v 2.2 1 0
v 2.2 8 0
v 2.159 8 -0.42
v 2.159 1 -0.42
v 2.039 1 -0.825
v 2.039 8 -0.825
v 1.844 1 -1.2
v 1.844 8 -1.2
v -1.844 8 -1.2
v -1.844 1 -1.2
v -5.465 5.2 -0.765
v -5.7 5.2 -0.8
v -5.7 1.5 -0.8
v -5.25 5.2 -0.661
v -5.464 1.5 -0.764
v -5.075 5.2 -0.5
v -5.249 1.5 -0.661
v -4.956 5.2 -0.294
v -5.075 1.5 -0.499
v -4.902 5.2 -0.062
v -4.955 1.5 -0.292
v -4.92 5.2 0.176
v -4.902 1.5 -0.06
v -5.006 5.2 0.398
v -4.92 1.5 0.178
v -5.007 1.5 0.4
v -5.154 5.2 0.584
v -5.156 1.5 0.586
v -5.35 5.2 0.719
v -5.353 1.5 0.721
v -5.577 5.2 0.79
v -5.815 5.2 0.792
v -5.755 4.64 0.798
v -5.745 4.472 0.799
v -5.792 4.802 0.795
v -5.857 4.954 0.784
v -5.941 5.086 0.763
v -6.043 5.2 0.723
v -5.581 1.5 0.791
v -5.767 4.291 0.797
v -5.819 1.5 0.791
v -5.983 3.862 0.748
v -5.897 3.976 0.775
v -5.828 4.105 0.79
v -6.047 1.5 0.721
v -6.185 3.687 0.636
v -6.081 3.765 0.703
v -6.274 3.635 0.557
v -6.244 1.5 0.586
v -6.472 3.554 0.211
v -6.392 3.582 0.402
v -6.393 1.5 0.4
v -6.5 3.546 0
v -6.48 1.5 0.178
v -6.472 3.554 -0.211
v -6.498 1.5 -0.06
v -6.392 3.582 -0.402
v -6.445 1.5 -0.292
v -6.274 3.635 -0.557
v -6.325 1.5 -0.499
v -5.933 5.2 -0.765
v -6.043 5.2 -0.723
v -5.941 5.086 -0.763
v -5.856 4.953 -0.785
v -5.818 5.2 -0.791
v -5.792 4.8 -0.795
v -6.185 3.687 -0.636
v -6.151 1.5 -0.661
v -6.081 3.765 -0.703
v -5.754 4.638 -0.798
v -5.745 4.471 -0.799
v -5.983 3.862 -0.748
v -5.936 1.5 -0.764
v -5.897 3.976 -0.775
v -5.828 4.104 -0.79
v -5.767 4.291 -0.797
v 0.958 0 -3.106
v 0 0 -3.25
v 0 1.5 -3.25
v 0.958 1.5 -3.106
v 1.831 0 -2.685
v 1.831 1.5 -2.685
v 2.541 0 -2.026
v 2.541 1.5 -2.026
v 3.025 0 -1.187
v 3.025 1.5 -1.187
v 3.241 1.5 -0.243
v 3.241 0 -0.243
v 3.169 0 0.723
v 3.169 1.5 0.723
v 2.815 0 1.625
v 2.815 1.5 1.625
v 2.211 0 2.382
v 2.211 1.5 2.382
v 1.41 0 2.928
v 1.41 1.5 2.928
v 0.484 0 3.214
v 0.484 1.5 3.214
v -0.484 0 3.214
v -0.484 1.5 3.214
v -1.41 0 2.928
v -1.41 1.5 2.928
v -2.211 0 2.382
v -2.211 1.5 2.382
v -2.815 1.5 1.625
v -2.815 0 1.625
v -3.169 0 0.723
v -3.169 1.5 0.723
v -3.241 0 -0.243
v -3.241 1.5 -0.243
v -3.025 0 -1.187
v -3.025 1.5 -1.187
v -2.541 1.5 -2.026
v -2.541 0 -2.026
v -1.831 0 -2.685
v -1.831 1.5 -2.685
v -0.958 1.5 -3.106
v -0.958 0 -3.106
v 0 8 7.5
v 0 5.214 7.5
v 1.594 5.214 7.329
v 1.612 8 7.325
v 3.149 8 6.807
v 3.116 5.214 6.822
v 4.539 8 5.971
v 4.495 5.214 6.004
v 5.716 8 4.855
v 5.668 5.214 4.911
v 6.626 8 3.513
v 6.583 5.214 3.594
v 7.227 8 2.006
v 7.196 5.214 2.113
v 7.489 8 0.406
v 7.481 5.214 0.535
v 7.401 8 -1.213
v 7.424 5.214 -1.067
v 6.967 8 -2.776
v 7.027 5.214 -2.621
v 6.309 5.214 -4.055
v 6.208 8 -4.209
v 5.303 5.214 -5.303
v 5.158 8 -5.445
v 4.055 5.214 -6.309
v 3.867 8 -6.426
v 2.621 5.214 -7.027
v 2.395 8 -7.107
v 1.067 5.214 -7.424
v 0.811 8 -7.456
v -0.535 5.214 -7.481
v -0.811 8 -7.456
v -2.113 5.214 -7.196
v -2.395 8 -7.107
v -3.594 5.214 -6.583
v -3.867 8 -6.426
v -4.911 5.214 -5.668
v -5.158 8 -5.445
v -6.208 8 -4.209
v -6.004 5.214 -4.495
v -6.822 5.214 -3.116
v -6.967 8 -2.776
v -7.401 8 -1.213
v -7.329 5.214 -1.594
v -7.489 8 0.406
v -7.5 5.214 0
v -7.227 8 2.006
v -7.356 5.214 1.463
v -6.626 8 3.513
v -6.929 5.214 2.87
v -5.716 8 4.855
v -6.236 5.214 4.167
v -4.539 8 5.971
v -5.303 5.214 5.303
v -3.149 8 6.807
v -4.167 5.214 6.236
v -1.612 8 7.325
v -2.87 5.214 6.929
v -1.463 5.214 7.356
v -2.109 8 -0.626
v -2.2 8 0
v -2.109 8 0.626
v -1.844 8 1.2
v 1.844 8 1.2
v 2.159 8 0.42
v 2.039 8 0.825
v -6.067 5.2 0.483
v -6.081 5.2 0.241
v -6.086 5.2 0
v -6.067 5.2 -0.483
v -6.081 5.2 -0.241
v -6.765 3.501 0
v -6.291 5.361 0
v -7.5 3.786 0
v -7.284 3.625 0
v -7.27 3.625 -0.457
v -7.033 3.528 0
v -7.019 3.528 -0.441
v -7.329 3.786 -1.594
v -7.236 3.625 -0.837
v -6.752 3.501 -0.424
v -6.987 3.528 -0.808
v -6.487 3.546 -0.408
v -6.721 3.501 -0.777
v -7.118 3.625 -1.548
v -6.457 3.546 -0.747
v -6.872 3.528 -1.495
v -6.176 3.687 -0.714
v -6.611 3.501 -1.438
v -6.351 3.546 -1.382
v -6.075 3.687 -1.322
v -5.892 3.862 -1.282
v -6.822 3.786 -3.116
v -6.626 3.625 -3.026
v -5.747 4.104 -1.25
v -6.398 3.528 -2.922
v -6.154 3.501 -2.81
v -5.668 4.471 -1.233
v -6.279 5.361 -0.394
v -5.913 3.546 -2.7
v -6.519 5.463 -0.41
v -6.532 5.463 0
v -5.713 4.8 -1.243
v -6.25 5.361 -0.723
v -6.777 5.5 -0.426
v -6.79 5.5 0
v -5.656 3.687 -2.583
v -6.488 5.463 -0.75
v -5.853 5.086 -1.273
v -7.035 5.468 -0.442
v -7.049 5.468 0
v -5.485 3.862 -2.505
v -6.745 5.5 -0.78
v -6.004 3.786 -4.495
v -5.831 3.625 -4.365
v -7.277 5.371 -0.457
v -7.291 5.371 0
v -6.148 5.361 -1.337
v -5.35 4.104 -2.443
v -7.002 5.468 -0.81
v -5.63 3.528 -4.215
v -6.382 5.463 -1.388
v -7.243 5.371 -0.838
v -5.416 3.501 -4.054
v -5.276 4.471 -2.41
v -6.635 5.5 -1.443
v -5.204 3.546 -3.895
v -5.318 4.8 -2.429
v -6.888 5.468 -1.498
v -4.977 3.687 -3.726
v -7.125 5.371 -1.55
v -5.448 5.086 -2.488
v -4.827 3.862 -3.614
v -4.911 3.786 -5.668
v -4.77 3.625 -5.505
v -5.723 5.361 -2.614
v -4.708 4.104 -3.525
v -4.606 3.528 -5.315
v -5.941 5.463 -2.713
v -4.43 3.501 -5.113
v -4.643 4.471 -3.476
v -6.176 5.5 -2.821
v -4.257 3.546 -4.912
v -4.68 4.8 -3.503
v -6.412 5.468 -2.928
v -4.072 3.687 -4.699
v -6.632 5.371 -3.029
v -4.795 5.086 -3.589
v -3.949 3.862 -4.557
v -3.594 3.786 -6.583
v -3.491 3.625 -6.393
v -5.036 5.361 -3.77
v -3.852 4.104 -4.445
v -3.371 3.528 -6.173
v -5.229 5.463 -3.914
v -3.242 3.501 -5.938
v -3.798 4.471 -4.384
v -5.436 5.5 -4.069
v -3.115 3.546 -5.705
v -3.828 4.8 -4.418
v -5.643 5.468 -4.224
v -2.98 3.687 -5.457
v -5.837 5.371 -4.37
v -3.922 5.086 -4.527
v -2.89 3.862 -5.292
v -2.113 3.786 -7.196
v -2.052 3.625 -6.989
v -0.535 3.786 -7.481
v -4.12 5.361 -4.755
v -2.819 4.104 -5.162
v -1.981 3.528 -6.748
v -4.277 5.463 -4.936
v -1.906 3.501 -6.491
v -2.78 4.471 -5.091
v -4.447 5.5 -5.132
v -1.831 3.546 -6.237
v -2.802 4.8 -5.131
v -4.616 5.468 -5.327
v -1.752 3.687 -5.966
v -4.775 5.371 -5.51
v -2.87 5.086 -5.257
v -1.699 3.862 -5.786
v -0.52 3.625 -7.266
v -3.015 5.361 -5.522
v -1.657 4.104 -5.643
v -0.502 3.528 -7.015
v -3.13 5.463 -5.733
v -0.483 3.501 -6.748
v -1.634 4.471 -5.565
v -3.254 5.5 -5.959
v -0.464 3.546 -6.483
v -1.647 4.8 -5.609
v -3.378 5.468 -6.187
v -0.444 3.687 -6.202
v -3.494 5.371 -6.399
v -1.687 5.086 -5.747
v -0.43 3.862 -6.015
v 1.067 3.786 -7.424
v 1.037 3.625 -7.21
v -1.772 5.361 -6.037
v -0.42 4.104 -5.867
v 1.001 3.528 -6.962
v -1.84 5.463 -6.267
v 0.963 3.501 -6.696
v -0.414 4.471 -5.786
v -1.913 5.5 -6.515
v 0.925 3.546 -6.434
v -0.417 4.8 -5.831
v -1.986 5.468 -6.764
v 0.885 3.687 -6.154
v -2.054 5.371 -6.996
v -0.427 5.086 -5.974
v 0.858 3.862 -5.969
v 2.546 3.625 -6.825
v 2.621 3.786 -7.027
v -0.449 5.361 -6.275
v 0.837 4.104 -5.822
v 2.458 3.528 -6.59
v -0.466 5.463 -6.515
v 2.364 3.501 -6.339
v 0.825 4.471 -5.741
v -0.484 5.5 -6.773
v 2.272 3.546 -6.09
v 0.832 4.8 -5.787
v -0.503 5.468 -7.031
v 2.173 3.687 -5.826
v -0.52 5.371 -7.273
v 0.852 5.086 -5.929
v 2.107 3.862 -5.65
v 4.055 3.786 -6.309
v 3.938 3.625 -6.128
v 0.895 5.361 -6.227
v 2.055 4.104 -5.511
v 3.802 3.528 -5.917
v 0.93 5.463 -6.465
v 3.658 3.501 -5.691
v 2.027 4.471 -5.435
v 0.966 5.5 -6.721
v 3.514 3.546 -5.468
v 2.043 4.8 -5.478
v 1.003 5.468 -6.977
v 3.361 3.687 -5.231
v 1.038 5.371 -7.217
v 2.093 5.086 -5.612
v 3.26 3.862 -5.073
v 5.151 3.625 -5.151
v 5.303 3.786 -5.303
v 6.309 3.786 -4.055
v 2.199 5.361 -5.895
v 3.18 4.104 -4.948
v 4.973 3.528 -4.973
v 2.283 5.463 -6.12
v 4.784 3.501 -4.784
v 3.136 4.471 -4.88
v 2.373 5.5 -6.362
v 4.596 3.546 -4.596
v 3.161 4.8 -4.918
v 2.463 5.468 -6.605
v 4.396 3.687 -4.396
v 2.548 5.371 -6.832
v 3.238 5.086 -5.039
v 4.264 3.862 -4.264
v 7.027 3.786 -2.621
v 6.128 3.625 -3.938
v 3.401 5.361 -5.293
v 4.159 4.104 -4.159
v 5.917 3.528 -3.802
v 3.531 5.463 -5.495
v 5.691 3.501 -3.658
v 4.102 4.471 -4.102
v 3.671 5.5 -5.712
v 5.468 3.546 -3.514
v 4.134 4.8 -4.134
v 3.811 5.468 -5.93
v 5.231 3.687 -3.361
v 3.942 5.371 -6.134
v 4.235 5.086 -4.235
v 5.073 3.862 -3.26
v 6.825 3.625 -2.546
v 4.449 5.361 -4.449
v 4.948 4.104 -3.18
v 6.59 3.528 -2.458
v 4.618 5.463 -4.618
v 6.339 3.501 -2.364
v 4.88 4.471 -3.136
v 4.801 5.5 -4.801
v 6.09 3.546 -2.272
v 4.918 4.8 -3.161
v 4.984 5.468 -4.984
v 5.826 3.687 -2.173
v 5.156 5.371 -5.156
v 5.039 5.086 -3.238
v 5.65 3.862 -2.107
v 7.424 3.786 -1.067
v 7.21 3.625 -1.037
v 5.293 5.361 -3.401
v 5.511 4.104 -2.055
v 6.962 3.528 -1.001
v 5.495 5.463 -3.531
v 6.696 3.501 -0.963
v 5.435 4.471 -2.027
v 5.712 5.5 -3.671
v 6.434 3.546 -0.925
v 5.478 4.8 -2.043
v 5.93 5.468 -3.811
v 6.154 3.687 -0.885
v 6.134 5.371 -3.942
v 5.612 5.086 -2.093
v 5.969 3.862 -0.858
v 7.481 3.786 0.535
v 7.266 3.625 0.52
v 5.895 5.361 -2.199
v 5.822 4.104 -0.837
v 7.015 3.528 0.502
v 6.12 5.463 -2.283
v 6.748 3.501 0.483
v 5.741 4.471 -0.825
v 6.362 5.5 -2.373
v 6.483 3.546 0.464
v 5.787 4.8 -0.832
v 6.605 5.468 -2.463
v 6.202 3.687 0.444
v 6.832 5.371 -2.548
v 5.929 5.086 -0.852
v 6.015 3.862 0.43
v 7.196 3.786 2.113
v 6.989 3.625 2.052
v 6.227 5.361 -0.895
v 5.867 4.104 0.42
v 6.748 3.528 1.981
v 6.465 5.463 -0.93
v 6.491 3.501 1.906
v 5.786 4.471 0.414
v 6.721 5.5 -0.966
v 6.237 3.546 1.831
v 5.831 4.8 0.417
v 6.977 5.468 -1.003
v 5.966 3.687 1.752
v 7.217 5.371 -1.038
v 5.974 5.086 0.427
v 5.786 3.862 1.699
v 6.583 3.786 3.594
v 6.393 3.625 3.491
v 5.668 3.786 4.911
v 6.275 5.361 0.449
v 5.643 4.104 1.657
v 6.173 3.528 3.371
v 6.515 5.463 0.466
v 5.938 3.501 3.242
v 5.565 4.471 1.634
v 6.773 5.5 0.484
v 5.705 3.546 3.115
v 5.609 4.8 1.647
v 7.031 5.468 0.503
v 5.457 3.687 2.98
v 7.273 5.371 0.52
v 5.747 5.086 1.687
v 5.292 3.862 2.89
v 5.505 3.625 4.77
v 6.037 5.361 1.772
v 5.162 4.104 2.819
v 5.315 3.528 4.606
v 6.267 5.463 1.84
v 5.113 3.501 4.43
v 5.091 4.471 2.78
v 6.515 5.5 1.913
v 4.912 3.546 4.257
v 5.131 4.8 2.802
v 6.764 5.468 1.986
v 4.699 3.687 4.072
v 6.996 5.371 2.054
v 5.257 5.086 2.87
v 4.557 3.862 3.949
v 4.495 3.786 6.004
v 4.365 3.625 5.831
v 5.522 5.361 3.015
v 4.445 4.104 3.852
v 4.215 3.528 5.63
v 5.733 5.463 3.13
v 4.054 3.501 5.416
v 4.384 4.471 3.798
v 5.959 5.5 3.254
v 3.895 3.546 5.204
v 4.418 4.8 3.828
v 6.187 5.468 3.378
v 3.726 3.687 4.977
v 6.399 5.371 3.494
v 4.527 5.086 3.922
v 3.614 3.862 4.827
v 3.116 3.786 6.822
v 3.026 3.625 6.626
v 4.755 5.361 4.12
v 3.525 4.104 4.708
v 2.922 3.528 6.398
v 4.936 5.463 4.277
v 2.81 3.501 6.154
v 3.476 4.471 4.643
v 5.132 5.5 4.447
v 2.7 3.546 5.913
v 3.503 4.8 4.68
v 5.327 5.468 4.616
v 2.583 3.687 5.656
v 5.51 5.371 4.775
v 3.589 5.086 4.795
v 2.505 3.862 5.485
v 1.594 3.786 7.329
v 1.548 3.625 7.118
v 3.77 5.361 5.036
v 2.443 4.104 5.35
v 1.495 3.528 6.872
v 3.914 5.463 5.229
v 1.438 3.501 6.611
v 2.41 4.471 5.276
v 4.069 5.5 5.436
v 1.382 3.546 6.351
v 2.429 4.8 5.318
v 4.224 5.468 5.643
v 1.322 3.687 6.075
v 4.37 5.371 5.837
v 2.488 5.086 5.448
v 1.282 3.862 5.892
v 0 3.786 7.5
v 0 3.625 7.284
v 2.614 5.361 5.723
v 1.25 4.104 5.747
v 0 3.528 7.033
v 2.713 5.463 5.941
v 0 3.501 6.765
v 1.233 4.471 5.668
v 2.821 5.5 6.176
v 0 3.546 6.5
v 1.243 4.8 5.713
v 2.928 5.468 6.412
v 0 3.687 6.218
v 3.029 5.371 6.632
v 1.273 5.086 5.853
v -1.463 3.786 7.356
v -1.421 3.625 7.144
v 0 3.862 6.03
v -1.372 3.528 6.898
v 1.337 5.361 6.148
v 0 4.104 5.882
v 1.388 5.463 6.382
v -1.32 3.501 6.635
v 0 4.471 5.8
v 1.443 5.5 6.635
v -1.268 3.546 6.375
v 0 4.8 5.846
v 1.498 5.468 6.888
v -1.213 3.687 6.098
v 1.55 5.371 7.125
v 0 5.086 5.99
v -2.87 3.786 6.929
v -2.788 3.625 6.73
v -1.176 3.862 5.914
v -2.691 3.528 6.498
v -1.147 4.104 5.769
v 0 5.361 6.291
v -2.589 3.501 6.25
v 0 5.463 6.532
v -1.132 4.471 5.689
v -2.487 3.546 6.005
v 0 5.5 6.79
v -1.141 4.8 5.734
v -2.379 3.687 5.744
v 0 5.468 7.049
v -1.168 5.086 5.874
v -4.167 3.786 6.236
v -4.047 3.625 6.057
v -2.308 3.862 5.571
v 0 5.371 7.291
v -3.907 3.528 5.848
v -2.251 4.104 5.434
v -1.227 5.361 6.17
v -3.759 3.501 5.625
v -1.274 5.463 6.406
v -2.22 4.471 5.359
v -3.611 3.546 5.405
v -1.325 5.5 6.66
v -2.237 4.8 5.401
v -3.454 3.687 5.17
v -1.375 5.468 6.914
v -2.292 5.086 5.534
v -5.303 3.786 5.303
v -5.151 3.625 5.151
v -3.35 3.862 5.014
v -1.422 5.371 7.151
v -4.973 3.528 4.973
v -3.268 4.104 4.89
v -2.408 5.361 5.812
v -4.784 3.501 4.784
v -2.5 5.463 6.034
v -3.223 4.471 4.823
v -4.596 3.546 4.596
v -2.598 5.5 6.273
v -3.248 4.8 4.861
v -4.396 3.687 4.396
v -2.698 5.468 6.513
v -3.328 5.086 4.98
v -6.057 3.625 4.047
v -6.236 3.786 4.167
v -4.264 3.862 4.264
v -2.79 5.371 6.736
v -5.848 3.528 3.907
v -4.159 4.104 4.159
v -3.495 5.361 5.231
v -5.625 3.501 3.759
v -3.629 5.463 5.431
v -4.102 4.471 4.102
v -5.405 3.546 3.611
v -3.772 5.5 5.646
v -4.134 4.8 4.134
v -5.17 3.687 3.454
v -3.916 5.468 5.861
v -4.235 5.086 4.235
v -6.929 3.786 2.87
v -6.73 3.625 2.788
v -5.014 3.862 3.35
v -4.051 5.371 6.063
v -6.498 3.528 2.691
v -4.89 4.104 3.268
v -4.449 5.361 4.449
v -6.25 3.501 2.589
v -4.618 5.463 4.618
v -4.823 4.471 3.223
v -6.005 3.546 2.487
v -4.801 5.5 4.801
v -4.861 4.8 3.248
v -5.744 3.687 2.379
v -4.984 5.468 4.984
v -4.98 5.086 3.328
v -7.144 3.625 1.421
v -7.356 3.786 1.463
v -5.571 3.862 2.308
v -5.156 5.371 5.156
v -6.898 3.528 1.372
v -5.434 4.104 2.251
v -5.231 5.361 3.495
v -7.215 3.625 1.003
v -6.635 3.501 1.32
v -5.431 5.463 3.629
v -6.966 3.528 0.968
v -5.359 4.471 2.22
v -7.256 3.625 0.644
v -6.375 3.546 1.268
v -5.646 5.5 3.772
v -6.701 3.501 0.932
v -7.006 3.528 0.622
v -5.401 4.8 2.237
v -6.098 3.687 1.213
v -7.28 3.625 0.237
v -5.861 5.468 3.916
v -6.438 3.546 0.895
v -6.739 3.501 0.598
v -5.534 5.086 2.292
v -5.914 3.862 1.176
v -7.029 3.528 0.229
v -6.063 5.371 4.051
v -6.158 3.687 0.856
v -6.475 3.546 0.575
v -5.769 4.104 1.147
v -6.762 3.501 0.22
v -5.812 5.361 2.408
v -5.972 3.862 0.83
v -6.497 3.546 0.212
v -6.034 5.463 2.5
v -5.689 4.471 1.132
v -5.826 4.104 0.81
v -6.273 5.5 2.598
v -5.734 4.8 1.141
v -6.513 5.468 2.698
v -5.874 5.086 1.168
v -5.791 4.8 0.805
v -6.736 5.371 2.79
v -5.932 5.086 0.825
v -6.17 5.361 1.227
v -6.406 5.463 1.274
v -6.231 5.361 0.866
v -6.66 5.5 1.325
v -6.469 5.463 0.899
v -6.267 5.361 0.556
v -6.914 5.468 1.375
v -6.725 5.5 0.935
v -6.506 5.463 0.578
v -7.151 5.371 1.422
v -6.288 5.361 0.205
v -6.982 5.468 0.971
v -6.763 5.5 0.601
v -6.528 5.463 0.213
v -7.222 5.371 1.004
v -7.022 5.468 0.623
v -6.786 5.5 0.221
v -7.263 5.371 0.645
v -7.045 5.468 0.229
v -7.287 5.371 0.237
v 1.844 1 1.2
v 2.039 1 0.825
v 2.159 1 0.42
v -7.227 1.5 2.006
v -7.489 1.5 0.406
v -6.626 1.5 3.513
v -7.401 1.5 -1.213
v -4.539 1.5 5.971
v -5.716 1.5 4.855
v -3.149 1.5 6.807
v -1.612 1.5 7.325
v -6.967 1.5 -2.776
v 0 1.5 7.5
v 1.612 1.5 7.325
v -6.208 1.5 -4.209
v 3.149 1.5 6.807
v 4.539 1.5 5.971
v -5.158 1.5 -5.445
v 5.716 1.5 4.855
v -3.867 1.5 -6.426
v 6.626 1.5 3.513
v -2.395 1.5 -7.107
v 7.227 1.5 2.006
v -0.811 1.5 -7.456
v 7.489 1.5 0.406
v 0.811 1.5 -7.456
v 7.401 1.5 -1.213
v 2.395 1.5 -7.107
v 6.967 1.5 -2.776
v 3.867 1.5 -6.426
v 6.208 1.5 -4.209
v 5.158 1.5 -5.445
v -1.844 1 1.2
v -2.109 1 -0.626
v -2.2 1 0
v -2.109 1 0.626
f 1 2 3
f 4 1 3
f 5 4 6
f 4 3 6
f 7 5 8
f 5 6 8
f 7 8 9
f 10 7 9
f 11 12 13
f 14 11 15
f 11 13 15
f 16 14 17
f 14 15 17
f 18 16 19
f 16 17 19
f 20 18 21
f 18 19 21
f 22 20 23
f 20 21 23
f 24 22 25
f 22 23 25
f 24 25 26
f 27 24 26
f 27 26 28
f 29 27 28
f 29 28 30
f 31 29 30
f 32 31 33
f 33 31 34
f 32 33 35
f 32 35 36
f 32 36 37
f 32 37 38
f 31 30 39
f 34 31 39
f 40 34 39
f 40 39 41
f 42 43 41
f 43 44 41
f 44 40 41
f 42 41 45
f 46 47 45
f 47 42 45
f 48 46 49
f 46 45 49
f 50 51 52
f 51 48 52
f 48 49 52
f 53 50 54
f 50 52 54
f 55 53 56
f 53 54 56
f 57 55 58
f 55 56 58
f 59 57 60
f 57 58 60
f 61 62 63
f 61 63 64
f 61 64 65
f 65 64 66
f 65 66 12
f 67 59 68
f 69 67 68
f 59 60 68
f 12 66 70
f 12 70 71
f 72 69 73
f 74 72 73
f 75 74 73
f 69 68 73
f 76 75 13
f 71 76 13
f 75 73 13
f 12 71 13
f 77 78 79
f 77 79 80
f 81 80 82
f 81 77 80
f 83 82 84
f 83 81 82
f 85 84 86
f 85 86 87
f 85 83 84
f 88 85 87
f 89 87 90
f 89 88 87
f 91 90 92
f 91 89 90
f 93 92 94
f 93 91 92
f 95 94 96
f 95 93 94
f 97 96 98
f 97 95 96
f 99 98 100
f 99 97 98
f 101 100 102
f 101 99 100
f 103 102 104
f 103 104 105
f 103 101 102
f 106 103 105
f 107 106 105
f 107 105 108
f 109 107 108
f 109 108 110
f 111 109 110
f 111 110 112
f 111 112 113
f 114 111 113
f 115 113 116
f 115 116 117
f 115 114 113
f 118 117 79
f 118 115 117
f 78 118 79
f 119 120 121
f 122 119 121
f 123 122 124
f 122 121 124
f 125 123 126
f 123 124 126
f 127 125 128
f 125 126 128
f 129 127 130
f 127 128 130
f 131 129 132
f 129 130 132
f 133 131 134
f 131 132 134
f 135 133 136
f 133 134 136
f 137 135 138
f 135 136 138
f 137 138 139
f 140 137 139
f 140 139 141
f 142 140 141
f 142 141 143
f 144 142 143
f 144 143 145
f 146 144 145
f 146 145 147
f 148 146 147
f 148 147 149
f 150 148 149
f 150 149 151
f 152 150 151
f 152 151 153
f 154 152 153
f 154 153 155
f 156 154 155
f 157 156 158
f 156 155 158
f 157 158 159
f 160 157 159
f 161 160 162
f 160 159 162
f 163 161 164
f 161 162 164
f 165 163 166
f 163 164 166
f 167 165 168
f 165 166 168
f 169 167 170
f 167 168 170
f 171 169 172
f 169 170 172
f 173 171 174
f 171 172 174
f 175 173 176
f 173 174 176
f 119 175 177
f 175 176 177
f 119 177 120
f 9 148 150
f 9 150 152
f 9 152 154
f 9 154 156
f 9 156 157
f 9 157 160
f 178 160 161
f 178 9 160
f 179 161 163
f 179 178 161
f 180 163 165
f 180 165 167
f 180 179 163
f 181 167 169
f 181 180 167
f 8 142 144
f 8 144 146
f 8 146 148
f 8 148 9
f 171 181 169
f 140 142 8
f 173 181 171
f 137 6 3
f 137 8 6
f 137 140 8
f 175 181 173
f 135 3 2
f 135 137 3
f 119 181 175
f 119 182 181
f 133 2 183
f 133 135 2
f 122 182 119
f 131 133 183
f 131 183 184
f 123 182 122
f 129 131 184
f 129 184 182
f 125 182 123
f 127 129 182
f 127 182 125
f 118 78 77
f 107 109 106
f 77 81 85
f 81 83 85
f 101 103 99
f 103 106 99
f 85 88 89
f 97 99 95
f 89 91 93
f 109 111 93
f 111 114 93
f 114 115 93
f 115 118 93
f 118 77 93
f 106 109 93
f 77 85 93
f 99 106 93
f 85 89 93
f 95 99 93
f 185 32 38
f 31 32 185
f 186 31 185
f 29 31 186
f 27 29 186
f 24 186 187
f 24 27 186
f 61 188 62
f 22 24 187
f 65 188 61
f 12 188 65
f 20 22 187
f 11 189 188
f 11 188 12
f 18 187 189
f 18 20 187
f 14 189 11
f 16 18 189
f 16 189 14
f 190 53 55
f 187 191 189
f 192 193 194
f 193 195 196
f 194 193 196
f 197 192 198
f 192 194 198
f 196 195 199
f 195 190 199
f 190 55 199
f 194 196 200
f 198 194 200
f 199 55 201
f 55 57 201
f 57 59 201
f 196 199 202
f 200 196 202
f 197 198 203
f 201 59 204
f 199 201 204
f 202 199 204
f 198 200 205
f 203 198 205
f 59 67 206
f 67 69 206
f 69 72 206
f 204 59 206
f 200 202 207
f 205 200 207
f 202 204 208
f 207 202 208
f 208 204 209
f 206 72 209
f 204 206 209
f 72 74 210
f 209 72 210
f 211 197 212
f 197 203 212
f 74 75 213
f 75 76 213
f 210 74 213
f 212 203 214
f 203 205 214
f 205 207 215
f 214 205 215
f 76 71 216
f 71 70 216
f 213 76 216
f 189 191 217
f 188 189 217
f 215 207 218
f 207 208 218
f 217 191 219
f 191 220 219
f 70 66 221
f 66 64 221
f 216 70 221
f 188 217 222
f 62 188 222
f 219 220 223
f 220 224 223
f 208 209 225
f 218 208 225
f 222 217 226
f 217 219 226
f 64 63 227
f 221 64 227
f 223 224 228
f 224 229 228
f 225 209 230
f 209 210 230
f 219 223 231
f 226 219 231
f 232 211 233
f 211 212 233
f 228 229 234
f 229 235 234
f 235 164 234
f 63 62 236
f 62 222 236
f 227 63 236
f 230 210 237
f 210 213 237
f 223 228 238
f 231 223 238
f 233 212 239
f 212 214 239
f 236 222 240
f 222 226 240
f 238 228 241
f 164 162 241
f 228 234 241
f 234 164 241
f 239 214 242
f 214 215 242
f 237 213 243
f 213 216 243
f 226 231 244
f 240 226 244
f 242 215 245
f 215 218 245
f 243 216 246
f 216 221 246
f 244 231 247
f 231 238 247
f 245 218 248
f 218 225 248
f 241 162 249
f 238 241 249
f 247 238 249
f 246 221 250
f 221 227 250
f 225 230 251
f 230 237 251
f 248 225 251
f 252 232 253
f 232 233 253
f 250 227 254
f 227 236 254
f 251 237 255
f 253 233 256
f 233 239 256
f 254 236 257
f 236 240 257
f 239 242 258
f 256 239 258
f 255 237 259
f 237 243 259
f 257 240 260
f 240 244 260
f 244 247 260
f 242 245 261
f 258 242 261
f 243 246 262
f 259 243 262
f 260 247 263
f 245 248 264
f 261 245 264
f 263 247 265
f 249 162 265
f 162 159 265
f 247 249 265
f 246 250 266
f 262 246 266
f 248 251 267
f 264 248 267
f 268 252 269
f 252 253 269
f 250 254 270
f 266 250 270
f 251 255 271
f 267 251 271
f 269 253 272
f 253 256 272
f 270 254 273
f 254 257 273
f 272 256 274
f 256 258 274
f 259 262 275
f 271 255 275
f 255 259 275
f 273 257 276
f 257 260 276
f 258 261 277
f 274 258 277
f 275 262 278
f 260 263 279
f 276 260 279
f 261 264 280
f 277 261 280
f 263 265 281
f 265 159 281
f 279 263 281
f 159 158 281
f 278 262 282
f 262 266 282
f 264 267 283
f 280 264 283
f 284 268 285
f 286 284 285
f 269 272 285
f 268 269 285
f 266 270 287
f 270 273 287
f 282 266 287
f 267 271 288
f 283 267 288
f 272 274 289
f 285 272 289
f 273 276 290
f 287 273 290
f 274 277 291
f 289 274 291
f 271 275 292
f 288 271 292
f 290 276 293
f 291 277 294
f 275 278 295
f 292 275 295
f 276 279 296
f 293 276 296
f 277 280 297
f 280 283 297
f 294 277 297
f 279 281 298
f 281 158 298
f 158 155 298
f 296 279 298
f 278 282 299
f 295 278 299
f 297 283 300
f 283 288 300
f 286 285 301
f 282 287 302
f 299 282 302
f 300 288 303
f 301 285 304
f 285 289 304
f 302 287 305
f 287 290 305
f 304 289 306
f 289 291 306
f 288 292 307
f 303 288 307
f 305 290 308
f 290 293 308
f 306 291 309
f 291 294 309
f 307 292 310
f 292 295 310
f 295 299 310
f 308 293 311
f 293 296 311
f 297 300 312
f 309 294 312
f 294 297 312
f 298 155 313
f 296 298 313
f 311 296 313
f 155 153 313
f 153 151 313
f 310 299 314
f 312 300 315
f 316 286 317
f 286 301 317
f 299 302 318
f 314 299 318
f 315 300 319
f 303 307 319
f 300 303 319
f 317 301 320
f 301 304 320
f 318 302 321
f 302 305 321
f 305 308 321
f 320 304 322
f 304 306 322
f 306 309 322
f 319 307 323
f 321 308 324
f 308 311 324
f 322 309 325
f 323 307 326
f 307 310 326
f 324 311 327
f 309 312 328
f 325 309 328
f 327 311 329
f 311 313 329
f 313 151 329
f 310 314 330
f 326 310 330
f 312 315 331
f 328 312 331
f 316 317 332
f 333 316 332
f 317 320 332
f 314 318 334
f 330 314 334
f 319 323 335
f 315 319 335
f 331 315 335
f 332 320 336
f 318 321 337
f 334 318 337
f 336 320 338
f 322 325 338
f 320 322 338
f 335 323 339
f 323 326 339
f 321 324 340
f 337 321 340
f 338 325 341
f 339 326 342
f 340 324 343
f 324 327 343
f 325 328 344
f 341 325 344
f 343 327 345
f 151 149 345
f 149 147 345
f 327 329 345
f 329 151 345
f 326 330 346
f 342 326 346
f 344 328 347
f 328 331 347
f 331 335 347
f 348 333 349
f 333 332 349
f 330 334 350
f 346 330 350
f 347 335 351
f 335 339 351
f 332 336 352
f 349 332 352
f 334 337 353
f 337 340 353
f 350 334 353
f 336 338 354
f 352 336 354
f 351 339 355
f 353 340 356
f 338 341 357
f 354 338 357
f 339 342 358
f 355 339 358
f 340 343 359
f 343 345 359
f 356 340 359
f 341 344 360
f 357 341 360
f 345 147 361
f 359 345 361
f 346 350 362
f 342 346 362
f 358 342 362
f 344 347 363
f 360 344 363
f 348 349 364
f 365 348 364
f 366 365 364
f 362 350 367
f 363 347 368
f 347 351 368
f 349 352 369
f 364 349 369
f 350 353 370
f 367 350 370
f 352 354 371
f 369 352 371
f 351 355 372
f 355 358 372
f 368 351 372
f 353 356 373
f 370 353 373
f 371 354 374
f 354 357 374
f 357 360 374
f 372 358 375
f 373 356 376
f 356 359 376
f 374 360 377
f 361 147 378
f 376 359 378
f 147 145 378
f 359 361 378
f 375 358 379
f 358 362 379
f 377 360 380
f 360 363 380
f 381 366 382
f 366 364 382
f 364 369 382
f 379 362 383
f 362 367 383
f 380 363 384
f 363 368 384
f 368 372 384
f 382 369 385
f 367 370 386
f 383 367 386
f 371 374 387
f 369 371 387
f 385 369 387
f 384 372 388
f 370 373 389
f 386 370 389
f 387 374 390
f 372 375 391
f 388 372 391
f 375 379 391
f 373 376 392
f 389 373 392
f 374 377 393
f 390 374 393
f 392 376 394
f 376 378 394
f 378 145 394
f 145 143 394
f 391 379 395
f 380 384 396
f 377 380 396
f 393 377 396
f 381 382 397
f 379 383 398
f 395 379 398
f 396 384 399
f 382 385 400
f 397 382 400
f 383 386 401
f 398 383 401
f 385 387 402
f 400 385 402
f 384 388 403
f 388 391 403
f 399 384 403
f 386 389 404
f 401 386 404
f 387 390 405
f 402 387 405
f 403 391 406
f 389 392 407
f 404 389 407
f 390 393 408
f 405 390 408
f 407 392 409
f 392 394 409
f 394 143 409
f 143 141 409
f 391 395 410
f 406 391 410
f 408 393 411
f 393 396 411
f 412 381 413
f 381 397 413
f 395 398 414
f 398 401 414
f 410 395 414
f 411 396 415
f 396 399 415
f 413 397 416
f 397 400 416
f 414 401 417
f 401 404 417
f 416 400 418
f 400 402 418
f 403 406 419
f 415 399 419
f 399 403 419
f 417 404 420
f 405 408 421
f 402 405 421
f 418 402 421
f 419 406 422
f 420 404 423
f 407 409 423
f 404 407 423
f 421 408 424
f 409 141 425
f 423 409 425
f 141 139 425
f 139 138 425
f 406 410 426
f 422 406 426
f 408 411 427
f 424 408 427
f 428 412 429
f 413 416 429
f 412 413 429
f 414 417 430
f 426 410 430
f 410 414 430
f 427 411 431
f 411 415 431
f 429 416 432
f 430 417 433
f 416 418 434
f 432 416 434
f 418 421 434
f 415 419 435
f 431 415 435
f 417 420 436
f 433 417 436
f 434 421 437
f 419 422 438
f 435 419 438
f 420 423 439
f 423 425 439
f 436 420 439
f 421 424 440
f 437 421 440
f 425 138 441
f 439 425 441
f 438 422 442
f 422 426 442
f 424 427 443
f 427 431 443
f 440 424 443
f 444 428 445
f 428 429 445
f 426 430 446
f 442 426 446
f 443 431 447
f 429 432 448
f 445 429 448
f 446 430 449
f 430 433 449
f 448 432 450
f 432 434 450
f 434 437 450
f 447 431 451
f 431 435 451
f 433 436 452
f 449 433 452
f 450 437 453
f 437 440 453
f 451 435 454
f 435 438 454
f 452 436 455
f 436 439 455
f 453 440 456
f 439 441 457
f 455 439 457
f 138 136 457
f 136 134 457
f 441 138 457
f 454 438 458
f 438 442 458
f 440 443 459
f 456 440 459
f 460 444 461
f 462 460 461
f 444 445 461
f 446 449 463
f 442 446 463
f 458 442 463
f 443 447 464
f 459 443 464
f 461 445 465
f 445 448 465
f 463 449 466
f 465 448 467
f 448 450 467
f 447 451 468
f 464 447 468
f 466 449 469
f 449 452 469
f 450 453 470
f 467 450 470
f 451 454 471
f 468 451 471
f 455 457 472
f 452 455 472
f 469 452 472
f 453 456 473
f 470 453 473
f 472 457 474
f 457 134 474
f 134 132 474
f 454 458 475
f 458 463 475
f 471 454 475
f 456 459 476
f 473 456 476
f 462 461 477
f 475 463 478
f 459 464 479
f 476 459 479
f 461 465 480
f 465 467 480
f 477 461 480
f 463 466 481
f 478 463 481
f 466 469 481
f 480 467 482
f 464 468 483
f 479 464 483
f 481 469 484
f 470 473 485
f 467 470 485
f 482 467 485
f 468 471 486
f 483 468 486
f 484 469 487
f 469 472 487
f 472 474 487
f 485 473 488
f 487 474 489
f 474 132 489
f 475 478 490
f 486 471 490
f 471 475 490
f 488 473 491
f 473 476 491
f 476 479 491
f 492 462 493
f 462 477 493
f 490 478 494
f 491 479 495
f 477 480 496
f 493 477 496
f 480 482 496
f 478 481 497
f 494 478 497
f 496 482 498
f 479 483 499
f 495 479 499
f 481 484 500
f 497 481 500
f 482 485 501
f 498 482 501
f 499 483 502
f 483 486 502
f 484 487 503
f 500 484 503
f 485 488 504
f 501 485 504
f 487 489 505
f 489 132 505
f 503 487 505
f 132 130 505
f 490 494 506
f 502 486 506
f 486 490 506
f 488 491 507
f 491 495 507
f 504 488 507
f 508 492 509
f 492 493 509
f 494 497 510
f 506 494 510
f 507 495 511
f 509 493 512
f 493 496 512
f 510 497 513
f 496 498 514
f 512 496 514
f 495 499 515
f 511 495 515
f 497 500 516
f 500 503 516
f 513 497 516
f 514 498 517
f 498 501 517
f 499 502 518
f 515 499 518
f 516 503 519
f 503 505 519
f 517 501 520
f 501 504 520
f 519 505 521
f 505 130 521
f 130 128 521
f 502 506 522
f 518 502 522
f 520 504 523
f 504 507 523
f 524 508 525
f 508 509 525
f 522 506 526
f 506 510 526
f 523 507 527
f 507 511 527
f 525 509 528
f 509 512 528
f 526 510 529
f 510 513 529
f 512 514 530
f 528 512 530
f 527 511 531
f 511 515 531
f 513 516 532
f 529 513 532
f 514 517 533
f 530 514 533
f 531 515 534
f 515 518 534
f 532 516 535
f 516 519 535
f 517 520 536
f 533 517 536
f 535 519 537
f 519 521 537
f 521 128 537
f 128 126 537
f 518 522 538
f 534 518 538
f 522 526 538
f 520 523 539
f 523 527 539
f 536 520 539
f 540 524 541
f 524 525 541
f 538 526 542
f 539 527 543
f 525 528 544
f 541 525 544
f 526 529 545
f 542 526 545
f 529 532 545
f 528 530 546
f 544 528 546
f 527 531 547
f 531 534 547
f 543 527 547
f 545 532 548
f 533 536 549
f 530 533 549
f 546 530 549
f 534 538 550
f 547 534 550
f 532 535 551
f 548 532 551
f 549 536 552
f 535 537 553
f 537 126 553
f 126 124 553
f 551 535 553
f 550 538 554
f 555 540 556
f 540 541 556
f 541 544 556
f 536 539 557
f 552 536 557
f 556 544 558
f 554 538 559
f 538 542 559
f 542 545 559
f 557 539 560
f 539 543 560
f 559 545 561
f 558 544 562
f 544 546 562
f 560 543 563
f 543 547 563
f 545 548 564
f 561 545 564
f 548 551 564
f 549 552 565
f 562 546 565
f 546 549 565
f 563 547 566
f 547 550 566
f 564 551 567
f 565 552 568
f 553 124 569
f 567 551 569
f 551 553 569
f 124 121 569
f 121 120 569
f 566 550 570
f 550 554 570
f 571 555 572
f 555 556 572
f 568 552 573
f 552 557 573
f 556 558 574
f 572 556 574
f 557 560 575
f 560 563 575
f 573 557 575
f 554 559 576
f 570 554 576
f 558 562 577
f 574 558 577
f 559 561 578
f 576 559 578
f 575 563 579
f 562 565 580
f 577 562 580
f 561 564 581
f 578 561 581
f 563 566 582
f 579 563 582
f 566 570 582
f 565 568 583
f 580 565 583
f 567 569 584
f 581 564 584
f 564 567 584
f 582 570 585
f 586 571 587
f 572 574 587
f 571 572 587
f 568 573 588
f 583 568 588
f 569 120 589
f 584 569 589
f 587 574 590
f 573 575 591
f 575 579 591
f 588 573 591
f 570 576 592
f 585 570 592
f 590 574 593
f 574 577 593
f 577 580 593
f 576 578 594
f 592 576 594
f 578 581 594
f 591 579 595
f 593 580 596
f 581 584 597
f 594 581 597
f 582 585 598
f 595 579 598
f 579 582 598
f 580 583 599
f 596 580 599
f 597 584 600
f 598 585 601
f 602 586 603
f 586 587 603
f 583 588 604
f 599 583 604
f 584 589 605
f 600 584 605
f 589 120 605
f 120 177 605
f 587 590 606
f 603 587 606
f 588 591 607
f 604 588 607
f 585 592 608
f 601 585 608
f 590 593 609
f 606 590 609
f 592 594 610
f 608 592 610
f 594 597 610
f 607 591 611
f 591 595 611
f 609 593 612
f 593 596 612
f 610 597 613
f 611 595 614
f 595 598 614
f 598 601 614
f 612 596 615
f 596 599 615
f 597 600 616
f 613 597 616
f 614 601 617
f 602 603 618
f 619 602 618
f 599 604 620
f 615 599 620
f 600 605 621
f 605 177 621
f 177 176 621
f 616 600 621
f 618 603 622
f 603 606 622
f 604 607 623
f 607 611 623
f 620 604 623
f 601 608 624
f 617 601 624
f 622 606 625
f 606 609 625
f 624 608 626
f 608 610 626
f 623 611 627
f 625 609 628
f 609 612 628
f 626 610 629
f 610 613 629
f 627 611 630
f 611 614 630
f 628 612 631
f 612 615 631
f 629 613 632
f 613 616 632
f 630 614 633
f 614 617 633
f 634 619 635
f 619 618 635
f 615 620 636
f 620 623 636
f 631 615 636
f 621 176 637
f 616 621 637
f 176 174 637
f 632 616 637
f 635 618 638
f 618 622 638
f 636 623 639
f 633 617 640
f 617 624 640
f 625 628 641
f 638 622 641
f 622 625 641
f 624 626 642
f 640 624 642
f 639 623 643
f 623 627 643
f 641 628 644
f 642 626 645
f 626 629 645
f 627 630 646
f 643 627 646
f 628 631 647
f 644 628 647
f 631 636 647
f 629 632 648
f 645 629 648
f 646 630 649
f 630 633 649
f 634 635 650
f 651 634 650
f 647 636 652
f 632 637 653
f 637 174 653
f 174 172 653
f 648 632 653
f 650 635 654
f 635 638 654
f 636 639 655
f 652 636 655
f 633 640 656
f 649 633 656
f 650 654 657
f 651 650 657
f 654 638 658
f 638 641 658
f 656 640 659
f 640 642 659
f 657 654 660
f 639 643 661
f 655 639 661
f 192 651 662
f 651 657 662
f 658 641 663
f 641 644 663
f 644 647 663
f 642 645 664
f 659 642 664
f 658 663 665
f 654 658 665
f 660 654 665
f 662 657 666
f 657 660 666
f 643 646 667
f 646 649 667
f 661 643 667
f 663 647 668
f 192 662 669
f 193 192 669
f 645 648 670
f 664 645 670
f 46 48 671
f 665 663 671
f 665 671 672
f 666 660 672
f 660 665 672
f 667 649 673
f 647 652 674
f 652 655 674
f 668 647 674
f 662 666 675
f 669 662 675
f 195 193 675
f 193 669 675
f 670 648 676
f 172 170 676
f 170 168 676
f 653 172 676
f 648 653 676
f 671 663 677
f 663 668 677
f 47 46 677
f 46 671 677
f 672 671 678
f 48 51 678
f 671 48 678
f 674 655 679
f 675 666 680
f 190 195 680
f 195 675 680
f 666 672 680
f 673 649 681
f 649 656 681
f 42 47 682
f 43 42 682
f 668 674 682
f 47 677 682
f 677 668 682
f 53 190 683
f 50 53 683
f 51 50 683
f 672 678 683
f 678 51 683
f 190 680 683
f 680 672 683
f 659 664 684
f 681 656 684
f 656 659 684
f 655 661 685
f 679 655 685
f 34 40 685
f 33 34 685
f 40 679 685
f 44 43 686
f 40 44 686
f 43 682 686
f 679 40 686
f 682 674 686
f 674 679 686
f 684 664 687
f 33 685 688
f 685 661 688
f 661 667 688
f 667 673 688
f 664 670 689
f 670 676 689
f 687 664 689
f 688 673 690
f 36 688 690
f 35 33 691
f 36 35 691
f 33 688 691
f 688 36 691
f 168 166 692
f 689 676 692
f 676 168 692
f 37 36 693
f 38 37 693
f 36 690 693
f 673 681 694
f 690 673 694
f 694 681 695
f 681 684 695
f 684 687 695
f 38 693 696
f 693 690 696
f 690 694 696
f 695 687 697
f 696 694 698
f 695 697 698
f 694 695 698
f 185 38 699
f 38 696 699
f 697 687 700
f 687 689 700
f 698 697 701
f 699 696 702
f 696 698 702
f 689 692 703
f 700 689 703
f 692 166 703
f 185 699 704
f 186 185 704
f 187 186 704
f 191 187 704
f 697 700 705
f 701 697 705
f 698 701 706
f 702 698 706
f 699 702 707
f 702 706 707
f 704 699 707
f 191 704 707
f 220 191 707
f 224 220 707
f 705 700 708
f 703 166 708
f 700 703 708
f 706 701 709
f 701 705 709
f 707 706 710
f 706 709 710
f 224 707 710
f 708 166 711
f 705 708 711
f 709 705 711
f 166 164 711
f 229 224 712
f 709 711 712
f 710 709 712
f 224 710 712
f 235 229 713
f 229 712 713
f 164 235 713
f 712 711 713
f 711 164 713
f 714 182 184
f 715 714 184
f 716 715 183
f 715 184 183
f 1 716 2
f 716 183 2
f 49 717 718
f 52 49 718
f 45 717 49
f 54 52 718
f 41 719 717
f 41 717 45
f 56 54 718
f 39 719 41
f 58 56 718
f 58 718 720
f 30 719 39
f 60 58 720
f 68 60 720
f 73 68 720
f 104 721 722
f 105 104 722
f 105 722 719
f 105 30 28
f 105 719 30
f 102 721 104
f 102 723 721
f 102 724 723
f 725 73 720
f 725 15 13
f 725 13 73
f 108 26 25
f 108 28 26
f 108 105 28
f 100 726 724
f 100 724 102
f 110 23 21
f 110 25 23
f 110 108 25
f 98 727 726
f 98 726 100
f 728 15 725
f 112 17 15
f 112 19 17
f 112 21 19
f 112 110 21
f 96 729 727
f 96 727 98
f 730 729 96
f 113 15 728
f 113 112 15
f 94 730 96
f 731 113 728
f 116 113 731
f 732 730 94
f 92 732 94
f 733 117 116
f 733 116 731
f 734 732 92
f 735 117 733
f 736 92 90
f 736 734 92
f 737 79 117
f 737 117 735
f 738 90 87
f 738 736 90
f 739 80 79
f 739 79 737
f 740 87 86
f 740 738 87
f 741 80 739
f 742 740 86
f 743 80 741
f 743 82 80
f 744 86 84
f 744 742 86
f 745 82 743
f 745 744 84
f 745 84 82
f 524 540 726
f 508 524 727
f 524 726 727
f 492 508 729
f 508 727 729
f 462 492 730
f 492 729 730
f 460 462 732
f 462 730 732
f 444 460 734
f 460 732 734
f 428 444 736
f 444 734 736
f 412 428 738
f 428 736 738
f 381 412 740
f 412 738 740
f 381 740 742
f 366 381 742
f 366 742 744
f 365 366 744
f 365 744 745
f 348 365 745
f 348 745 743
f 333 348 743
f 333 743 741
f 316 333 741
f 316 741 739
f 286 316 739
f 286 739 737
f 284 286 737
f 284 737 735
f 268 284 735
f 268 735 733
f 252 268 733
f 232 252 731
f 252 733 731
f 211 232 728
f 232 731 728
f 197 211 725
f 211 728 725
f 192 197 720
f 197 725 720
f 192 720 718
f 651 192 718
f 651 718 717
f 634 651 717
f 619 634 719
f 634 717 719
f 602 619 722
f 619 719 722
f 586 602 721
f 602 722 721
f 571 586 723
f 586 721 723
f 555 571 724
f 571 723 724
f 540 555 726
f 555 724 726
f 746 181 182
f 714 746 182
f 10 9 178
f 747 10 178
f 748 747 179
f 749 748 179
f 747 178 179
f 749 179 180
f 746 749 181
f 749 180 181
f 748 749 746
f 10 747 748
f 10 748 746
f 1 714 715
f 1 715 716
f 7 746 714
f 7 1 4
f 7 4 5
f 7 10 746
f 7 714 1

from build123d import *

# Parameters (mm, degrees)
SKETCH_1_R          = 2.75
EXTRUDE_1_DEPTH     = 8
CUT_EXTRUDE_1_DEPTH = 7
EXTRUDE_2_DEPTH     = 3.5
EXTRUDE_START       = -8
SKETCH_5_R          = 7.5
SKETCH_5_R_2        = 2.75
EXTRUDE_3_DEPTH     = 8
SWEEP_1_PROFILE_R   = 1
SKETCH_47_R         = 7.5
SKETCH_47_R_2       = 3.25
CUT_EXTRUDE_3_DEPTH = 1.5
SKETCH_48_R         = 0.8
CUT_EXTRUDE_4_DEPTH = 3.7
CUT_EXTRUDE_6_DEPTH = 3.5


with BuildPart() as part:
    # 草图1 → 凸台-拉伸1 (new body)
    with BuildSketch(Plane(origin=(0, 0, 0), x_dir=(1, 0, 0), z_dir=(0, 1, 0))):
        with Locations(Location((0, 0, 0), (0, 0, 270))):
            Circle(SKETCH_1_R)
    extrude(amount=EXTRUDE_1_DEPTH)

    # 草图2 → 切除-拉伸1 (cut)
    with BuildSketch(Plane(origin=(0, 8, 0), x_dir=(1, 0, 0), z_dir=(0, 1, 0))):
        with BuildLine():
            Line((1.843908891, 1.2), (-1.843908891, 1.2))
            ThreePointArc((-1.843908891, 1.2), (-2.2, 0), (-1.843908891, -1.2))
            Line((-1.843908891, -1.2), (1.843908891, -1.2))
            ThreePointArc((1.843908891, -1.2), (2.109099282, -0.625859584), (2.2, 0))
            ThreePointArc((2.2, 0), (2.109099282, 0.625859584), (1.843908891, 1.2))
        make_face()
    extrude(amount=-CUT_EXTRUDE_1_DEPTH, mode=Mode.SUBTRACT)

    # 草图4 → 凸台-拉伸2 (add)
    with BuildSketch(Plane(origin=(0, 8, 0), x_dir=(1, 0, 0), z_dir=(0, 1, 0))):
        with BuildLine():
            ThreePointArc((1.6, 1.2), (0, 2), (-1.6, 1.2))
            Line((-1.6, 1.2), (1.6, 1.2))
        make_face()
        with BuildLine():
            ThreePointArc((-1.6, -1.2), (0, -2), (1.6, -1.2))
            Line((1.6, -1.2), (-1.6, -1.2))
        make_face()
    extrude(amount=EXTRUDE_2_DEPTH)

    # 草图5 → 凸台-拉伸3 (add)
    with BuildSketch(Plane(origin=(0, 8, 0), x_dir=(1, 0, 0), z_dir=(0, 1, 0)).offset(EXTRUDE_START)):
        with Locations(Location((0, 0, 0), (0, 0, 270))):
            Circle(SKETCH_5_R)
        Circle(SKETCH_5_R_2, mode=Mode.SUBTRACT)
    extrude(amount=EXTRUDE_3_DEPTH)

    # 切除-扫描1: sweep along a path in 草图16
    with BuildLine(Plane(origin=(0, 4.5, 0), x_dir=(-1, 0, 0), z_dir=(0, -1, 0))) as sweep_1_path:
        CenterArc((0, 0), 6.8, 0, 360)
    # 切除-扫描1 profile (on start of the path) → 切除-扫描1 (sweep, cut)
    with BuildSketch(Plane(origin=(-6.8, 4.5, 0), x_dir=(-1, 0, 0), z_dir=(0, 0, -1))):
        Circle(SWEEP_1_PROFILE_R)
    sweep(path=sweep_1_path.line, mode=Mode.SUBTRACT)

    # 草图47 → 切除-拉伸3 (cut)
    with BuildSketch(Plane.XZ):
        with Locations(Location((0, 0, 0), (0, 0, 270))):
            Circle(SKETCH_47_R)
        with Locations(Location((0, 0, 0), (0, 0, 270))):
            Circle(SKETCH_47_R_2, mode=Mode.SUBTRACT)
    extrude(amount=-CUT_EXTRUDE_3_DEPTH, mode=Mode.SUBTRACT)

    # 草图48 → 切除-拉伸4 (cut)
    with BuildSketch(Plane.XZ.offset(-1.5)):
        with Locations(Location((-5.7, 0, 0), (0, 0, 270))):
            Circle(SKETCH_48_R)
    extrude(amount=-CUT_EXTRUDE_4_DEPTH, mode=Mode.SUBTRACT)

    # 草图56 → 切除-拉伸6 (cut)
    with BuildSketch(Plane(origin=(0, 8, 0), x_dir=(1, 0, 0), z_dir=(0, 1, 0))):
        with BuildLine():
            Line((1.6, -1.2), (-1.6, -1.2))
            ThreePointArc((-1.6, -1.2), (0, -2), (1.6, -1.2))
        make_face()
        with BuildLine():
            Line((-1.6, 1.2), (1.6, 1.2))
            ThreePointArc((1.6, 1.2), (0, 2), (-1.6, 1.2))
        make_face()
    extrude(amount=CUT_EXTRUDE_6_DEPTH, mode=Mode.SUBTRACT)


solid = part.part
